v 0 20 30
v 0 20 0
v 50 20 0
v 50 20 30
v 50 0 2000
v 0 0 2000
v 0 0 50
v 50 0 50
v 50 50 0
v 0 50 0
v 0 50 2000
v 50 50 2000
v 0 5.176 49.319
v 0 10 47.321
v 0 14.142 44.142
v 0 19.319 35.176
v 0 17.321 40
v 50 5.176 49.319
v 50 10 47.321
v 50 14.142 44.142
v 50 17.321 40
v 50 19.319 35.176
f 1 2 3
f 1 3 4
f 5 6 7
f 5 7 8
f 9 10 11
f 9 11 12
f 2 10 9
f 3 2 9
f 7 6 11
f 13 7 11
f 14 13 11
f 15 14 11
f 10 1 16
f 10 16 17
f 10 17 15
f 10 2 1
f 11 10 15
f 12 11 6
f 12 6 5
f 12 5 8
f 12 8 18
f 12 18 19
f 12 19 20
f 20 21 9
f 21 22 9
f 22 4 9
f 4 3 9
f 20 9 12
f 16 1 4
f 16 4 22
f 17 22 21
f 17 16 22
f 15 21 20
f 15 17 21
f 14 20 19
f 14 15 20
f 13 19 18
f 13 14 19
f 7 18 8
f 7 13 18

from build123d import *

# Parameters (mm, degrees)
F0_W     = 50
F0_H     = 50
F1_DEPTH = 2000
F3_DEPTH = 50.001


with BuildPart() as f1:
    # F0 (on Top) → F1 (new body)
    with BuildSketch(Plane.XY):
        with Locations((25, 25)):
            Rectangle(F0_W, F0_H)
    extrude(amount=F1_DEPTH)

    # F2 (on Right) → F3 (cut, through all)
    with BuildSketch(Plane.YZ):
        with BuildLine():
            Line((0, 50), (0, 0))
            Line((0, 0), (20, 0))
            Line((20, 0), (20, 30))
            ThreePointArc((20, 30), (14.142136, 44.142136), (0, 50))
        make_face()
    extrude(amount=F3_DEPTH, mode=Mode.SUBTRACT)


solid = f1.part
